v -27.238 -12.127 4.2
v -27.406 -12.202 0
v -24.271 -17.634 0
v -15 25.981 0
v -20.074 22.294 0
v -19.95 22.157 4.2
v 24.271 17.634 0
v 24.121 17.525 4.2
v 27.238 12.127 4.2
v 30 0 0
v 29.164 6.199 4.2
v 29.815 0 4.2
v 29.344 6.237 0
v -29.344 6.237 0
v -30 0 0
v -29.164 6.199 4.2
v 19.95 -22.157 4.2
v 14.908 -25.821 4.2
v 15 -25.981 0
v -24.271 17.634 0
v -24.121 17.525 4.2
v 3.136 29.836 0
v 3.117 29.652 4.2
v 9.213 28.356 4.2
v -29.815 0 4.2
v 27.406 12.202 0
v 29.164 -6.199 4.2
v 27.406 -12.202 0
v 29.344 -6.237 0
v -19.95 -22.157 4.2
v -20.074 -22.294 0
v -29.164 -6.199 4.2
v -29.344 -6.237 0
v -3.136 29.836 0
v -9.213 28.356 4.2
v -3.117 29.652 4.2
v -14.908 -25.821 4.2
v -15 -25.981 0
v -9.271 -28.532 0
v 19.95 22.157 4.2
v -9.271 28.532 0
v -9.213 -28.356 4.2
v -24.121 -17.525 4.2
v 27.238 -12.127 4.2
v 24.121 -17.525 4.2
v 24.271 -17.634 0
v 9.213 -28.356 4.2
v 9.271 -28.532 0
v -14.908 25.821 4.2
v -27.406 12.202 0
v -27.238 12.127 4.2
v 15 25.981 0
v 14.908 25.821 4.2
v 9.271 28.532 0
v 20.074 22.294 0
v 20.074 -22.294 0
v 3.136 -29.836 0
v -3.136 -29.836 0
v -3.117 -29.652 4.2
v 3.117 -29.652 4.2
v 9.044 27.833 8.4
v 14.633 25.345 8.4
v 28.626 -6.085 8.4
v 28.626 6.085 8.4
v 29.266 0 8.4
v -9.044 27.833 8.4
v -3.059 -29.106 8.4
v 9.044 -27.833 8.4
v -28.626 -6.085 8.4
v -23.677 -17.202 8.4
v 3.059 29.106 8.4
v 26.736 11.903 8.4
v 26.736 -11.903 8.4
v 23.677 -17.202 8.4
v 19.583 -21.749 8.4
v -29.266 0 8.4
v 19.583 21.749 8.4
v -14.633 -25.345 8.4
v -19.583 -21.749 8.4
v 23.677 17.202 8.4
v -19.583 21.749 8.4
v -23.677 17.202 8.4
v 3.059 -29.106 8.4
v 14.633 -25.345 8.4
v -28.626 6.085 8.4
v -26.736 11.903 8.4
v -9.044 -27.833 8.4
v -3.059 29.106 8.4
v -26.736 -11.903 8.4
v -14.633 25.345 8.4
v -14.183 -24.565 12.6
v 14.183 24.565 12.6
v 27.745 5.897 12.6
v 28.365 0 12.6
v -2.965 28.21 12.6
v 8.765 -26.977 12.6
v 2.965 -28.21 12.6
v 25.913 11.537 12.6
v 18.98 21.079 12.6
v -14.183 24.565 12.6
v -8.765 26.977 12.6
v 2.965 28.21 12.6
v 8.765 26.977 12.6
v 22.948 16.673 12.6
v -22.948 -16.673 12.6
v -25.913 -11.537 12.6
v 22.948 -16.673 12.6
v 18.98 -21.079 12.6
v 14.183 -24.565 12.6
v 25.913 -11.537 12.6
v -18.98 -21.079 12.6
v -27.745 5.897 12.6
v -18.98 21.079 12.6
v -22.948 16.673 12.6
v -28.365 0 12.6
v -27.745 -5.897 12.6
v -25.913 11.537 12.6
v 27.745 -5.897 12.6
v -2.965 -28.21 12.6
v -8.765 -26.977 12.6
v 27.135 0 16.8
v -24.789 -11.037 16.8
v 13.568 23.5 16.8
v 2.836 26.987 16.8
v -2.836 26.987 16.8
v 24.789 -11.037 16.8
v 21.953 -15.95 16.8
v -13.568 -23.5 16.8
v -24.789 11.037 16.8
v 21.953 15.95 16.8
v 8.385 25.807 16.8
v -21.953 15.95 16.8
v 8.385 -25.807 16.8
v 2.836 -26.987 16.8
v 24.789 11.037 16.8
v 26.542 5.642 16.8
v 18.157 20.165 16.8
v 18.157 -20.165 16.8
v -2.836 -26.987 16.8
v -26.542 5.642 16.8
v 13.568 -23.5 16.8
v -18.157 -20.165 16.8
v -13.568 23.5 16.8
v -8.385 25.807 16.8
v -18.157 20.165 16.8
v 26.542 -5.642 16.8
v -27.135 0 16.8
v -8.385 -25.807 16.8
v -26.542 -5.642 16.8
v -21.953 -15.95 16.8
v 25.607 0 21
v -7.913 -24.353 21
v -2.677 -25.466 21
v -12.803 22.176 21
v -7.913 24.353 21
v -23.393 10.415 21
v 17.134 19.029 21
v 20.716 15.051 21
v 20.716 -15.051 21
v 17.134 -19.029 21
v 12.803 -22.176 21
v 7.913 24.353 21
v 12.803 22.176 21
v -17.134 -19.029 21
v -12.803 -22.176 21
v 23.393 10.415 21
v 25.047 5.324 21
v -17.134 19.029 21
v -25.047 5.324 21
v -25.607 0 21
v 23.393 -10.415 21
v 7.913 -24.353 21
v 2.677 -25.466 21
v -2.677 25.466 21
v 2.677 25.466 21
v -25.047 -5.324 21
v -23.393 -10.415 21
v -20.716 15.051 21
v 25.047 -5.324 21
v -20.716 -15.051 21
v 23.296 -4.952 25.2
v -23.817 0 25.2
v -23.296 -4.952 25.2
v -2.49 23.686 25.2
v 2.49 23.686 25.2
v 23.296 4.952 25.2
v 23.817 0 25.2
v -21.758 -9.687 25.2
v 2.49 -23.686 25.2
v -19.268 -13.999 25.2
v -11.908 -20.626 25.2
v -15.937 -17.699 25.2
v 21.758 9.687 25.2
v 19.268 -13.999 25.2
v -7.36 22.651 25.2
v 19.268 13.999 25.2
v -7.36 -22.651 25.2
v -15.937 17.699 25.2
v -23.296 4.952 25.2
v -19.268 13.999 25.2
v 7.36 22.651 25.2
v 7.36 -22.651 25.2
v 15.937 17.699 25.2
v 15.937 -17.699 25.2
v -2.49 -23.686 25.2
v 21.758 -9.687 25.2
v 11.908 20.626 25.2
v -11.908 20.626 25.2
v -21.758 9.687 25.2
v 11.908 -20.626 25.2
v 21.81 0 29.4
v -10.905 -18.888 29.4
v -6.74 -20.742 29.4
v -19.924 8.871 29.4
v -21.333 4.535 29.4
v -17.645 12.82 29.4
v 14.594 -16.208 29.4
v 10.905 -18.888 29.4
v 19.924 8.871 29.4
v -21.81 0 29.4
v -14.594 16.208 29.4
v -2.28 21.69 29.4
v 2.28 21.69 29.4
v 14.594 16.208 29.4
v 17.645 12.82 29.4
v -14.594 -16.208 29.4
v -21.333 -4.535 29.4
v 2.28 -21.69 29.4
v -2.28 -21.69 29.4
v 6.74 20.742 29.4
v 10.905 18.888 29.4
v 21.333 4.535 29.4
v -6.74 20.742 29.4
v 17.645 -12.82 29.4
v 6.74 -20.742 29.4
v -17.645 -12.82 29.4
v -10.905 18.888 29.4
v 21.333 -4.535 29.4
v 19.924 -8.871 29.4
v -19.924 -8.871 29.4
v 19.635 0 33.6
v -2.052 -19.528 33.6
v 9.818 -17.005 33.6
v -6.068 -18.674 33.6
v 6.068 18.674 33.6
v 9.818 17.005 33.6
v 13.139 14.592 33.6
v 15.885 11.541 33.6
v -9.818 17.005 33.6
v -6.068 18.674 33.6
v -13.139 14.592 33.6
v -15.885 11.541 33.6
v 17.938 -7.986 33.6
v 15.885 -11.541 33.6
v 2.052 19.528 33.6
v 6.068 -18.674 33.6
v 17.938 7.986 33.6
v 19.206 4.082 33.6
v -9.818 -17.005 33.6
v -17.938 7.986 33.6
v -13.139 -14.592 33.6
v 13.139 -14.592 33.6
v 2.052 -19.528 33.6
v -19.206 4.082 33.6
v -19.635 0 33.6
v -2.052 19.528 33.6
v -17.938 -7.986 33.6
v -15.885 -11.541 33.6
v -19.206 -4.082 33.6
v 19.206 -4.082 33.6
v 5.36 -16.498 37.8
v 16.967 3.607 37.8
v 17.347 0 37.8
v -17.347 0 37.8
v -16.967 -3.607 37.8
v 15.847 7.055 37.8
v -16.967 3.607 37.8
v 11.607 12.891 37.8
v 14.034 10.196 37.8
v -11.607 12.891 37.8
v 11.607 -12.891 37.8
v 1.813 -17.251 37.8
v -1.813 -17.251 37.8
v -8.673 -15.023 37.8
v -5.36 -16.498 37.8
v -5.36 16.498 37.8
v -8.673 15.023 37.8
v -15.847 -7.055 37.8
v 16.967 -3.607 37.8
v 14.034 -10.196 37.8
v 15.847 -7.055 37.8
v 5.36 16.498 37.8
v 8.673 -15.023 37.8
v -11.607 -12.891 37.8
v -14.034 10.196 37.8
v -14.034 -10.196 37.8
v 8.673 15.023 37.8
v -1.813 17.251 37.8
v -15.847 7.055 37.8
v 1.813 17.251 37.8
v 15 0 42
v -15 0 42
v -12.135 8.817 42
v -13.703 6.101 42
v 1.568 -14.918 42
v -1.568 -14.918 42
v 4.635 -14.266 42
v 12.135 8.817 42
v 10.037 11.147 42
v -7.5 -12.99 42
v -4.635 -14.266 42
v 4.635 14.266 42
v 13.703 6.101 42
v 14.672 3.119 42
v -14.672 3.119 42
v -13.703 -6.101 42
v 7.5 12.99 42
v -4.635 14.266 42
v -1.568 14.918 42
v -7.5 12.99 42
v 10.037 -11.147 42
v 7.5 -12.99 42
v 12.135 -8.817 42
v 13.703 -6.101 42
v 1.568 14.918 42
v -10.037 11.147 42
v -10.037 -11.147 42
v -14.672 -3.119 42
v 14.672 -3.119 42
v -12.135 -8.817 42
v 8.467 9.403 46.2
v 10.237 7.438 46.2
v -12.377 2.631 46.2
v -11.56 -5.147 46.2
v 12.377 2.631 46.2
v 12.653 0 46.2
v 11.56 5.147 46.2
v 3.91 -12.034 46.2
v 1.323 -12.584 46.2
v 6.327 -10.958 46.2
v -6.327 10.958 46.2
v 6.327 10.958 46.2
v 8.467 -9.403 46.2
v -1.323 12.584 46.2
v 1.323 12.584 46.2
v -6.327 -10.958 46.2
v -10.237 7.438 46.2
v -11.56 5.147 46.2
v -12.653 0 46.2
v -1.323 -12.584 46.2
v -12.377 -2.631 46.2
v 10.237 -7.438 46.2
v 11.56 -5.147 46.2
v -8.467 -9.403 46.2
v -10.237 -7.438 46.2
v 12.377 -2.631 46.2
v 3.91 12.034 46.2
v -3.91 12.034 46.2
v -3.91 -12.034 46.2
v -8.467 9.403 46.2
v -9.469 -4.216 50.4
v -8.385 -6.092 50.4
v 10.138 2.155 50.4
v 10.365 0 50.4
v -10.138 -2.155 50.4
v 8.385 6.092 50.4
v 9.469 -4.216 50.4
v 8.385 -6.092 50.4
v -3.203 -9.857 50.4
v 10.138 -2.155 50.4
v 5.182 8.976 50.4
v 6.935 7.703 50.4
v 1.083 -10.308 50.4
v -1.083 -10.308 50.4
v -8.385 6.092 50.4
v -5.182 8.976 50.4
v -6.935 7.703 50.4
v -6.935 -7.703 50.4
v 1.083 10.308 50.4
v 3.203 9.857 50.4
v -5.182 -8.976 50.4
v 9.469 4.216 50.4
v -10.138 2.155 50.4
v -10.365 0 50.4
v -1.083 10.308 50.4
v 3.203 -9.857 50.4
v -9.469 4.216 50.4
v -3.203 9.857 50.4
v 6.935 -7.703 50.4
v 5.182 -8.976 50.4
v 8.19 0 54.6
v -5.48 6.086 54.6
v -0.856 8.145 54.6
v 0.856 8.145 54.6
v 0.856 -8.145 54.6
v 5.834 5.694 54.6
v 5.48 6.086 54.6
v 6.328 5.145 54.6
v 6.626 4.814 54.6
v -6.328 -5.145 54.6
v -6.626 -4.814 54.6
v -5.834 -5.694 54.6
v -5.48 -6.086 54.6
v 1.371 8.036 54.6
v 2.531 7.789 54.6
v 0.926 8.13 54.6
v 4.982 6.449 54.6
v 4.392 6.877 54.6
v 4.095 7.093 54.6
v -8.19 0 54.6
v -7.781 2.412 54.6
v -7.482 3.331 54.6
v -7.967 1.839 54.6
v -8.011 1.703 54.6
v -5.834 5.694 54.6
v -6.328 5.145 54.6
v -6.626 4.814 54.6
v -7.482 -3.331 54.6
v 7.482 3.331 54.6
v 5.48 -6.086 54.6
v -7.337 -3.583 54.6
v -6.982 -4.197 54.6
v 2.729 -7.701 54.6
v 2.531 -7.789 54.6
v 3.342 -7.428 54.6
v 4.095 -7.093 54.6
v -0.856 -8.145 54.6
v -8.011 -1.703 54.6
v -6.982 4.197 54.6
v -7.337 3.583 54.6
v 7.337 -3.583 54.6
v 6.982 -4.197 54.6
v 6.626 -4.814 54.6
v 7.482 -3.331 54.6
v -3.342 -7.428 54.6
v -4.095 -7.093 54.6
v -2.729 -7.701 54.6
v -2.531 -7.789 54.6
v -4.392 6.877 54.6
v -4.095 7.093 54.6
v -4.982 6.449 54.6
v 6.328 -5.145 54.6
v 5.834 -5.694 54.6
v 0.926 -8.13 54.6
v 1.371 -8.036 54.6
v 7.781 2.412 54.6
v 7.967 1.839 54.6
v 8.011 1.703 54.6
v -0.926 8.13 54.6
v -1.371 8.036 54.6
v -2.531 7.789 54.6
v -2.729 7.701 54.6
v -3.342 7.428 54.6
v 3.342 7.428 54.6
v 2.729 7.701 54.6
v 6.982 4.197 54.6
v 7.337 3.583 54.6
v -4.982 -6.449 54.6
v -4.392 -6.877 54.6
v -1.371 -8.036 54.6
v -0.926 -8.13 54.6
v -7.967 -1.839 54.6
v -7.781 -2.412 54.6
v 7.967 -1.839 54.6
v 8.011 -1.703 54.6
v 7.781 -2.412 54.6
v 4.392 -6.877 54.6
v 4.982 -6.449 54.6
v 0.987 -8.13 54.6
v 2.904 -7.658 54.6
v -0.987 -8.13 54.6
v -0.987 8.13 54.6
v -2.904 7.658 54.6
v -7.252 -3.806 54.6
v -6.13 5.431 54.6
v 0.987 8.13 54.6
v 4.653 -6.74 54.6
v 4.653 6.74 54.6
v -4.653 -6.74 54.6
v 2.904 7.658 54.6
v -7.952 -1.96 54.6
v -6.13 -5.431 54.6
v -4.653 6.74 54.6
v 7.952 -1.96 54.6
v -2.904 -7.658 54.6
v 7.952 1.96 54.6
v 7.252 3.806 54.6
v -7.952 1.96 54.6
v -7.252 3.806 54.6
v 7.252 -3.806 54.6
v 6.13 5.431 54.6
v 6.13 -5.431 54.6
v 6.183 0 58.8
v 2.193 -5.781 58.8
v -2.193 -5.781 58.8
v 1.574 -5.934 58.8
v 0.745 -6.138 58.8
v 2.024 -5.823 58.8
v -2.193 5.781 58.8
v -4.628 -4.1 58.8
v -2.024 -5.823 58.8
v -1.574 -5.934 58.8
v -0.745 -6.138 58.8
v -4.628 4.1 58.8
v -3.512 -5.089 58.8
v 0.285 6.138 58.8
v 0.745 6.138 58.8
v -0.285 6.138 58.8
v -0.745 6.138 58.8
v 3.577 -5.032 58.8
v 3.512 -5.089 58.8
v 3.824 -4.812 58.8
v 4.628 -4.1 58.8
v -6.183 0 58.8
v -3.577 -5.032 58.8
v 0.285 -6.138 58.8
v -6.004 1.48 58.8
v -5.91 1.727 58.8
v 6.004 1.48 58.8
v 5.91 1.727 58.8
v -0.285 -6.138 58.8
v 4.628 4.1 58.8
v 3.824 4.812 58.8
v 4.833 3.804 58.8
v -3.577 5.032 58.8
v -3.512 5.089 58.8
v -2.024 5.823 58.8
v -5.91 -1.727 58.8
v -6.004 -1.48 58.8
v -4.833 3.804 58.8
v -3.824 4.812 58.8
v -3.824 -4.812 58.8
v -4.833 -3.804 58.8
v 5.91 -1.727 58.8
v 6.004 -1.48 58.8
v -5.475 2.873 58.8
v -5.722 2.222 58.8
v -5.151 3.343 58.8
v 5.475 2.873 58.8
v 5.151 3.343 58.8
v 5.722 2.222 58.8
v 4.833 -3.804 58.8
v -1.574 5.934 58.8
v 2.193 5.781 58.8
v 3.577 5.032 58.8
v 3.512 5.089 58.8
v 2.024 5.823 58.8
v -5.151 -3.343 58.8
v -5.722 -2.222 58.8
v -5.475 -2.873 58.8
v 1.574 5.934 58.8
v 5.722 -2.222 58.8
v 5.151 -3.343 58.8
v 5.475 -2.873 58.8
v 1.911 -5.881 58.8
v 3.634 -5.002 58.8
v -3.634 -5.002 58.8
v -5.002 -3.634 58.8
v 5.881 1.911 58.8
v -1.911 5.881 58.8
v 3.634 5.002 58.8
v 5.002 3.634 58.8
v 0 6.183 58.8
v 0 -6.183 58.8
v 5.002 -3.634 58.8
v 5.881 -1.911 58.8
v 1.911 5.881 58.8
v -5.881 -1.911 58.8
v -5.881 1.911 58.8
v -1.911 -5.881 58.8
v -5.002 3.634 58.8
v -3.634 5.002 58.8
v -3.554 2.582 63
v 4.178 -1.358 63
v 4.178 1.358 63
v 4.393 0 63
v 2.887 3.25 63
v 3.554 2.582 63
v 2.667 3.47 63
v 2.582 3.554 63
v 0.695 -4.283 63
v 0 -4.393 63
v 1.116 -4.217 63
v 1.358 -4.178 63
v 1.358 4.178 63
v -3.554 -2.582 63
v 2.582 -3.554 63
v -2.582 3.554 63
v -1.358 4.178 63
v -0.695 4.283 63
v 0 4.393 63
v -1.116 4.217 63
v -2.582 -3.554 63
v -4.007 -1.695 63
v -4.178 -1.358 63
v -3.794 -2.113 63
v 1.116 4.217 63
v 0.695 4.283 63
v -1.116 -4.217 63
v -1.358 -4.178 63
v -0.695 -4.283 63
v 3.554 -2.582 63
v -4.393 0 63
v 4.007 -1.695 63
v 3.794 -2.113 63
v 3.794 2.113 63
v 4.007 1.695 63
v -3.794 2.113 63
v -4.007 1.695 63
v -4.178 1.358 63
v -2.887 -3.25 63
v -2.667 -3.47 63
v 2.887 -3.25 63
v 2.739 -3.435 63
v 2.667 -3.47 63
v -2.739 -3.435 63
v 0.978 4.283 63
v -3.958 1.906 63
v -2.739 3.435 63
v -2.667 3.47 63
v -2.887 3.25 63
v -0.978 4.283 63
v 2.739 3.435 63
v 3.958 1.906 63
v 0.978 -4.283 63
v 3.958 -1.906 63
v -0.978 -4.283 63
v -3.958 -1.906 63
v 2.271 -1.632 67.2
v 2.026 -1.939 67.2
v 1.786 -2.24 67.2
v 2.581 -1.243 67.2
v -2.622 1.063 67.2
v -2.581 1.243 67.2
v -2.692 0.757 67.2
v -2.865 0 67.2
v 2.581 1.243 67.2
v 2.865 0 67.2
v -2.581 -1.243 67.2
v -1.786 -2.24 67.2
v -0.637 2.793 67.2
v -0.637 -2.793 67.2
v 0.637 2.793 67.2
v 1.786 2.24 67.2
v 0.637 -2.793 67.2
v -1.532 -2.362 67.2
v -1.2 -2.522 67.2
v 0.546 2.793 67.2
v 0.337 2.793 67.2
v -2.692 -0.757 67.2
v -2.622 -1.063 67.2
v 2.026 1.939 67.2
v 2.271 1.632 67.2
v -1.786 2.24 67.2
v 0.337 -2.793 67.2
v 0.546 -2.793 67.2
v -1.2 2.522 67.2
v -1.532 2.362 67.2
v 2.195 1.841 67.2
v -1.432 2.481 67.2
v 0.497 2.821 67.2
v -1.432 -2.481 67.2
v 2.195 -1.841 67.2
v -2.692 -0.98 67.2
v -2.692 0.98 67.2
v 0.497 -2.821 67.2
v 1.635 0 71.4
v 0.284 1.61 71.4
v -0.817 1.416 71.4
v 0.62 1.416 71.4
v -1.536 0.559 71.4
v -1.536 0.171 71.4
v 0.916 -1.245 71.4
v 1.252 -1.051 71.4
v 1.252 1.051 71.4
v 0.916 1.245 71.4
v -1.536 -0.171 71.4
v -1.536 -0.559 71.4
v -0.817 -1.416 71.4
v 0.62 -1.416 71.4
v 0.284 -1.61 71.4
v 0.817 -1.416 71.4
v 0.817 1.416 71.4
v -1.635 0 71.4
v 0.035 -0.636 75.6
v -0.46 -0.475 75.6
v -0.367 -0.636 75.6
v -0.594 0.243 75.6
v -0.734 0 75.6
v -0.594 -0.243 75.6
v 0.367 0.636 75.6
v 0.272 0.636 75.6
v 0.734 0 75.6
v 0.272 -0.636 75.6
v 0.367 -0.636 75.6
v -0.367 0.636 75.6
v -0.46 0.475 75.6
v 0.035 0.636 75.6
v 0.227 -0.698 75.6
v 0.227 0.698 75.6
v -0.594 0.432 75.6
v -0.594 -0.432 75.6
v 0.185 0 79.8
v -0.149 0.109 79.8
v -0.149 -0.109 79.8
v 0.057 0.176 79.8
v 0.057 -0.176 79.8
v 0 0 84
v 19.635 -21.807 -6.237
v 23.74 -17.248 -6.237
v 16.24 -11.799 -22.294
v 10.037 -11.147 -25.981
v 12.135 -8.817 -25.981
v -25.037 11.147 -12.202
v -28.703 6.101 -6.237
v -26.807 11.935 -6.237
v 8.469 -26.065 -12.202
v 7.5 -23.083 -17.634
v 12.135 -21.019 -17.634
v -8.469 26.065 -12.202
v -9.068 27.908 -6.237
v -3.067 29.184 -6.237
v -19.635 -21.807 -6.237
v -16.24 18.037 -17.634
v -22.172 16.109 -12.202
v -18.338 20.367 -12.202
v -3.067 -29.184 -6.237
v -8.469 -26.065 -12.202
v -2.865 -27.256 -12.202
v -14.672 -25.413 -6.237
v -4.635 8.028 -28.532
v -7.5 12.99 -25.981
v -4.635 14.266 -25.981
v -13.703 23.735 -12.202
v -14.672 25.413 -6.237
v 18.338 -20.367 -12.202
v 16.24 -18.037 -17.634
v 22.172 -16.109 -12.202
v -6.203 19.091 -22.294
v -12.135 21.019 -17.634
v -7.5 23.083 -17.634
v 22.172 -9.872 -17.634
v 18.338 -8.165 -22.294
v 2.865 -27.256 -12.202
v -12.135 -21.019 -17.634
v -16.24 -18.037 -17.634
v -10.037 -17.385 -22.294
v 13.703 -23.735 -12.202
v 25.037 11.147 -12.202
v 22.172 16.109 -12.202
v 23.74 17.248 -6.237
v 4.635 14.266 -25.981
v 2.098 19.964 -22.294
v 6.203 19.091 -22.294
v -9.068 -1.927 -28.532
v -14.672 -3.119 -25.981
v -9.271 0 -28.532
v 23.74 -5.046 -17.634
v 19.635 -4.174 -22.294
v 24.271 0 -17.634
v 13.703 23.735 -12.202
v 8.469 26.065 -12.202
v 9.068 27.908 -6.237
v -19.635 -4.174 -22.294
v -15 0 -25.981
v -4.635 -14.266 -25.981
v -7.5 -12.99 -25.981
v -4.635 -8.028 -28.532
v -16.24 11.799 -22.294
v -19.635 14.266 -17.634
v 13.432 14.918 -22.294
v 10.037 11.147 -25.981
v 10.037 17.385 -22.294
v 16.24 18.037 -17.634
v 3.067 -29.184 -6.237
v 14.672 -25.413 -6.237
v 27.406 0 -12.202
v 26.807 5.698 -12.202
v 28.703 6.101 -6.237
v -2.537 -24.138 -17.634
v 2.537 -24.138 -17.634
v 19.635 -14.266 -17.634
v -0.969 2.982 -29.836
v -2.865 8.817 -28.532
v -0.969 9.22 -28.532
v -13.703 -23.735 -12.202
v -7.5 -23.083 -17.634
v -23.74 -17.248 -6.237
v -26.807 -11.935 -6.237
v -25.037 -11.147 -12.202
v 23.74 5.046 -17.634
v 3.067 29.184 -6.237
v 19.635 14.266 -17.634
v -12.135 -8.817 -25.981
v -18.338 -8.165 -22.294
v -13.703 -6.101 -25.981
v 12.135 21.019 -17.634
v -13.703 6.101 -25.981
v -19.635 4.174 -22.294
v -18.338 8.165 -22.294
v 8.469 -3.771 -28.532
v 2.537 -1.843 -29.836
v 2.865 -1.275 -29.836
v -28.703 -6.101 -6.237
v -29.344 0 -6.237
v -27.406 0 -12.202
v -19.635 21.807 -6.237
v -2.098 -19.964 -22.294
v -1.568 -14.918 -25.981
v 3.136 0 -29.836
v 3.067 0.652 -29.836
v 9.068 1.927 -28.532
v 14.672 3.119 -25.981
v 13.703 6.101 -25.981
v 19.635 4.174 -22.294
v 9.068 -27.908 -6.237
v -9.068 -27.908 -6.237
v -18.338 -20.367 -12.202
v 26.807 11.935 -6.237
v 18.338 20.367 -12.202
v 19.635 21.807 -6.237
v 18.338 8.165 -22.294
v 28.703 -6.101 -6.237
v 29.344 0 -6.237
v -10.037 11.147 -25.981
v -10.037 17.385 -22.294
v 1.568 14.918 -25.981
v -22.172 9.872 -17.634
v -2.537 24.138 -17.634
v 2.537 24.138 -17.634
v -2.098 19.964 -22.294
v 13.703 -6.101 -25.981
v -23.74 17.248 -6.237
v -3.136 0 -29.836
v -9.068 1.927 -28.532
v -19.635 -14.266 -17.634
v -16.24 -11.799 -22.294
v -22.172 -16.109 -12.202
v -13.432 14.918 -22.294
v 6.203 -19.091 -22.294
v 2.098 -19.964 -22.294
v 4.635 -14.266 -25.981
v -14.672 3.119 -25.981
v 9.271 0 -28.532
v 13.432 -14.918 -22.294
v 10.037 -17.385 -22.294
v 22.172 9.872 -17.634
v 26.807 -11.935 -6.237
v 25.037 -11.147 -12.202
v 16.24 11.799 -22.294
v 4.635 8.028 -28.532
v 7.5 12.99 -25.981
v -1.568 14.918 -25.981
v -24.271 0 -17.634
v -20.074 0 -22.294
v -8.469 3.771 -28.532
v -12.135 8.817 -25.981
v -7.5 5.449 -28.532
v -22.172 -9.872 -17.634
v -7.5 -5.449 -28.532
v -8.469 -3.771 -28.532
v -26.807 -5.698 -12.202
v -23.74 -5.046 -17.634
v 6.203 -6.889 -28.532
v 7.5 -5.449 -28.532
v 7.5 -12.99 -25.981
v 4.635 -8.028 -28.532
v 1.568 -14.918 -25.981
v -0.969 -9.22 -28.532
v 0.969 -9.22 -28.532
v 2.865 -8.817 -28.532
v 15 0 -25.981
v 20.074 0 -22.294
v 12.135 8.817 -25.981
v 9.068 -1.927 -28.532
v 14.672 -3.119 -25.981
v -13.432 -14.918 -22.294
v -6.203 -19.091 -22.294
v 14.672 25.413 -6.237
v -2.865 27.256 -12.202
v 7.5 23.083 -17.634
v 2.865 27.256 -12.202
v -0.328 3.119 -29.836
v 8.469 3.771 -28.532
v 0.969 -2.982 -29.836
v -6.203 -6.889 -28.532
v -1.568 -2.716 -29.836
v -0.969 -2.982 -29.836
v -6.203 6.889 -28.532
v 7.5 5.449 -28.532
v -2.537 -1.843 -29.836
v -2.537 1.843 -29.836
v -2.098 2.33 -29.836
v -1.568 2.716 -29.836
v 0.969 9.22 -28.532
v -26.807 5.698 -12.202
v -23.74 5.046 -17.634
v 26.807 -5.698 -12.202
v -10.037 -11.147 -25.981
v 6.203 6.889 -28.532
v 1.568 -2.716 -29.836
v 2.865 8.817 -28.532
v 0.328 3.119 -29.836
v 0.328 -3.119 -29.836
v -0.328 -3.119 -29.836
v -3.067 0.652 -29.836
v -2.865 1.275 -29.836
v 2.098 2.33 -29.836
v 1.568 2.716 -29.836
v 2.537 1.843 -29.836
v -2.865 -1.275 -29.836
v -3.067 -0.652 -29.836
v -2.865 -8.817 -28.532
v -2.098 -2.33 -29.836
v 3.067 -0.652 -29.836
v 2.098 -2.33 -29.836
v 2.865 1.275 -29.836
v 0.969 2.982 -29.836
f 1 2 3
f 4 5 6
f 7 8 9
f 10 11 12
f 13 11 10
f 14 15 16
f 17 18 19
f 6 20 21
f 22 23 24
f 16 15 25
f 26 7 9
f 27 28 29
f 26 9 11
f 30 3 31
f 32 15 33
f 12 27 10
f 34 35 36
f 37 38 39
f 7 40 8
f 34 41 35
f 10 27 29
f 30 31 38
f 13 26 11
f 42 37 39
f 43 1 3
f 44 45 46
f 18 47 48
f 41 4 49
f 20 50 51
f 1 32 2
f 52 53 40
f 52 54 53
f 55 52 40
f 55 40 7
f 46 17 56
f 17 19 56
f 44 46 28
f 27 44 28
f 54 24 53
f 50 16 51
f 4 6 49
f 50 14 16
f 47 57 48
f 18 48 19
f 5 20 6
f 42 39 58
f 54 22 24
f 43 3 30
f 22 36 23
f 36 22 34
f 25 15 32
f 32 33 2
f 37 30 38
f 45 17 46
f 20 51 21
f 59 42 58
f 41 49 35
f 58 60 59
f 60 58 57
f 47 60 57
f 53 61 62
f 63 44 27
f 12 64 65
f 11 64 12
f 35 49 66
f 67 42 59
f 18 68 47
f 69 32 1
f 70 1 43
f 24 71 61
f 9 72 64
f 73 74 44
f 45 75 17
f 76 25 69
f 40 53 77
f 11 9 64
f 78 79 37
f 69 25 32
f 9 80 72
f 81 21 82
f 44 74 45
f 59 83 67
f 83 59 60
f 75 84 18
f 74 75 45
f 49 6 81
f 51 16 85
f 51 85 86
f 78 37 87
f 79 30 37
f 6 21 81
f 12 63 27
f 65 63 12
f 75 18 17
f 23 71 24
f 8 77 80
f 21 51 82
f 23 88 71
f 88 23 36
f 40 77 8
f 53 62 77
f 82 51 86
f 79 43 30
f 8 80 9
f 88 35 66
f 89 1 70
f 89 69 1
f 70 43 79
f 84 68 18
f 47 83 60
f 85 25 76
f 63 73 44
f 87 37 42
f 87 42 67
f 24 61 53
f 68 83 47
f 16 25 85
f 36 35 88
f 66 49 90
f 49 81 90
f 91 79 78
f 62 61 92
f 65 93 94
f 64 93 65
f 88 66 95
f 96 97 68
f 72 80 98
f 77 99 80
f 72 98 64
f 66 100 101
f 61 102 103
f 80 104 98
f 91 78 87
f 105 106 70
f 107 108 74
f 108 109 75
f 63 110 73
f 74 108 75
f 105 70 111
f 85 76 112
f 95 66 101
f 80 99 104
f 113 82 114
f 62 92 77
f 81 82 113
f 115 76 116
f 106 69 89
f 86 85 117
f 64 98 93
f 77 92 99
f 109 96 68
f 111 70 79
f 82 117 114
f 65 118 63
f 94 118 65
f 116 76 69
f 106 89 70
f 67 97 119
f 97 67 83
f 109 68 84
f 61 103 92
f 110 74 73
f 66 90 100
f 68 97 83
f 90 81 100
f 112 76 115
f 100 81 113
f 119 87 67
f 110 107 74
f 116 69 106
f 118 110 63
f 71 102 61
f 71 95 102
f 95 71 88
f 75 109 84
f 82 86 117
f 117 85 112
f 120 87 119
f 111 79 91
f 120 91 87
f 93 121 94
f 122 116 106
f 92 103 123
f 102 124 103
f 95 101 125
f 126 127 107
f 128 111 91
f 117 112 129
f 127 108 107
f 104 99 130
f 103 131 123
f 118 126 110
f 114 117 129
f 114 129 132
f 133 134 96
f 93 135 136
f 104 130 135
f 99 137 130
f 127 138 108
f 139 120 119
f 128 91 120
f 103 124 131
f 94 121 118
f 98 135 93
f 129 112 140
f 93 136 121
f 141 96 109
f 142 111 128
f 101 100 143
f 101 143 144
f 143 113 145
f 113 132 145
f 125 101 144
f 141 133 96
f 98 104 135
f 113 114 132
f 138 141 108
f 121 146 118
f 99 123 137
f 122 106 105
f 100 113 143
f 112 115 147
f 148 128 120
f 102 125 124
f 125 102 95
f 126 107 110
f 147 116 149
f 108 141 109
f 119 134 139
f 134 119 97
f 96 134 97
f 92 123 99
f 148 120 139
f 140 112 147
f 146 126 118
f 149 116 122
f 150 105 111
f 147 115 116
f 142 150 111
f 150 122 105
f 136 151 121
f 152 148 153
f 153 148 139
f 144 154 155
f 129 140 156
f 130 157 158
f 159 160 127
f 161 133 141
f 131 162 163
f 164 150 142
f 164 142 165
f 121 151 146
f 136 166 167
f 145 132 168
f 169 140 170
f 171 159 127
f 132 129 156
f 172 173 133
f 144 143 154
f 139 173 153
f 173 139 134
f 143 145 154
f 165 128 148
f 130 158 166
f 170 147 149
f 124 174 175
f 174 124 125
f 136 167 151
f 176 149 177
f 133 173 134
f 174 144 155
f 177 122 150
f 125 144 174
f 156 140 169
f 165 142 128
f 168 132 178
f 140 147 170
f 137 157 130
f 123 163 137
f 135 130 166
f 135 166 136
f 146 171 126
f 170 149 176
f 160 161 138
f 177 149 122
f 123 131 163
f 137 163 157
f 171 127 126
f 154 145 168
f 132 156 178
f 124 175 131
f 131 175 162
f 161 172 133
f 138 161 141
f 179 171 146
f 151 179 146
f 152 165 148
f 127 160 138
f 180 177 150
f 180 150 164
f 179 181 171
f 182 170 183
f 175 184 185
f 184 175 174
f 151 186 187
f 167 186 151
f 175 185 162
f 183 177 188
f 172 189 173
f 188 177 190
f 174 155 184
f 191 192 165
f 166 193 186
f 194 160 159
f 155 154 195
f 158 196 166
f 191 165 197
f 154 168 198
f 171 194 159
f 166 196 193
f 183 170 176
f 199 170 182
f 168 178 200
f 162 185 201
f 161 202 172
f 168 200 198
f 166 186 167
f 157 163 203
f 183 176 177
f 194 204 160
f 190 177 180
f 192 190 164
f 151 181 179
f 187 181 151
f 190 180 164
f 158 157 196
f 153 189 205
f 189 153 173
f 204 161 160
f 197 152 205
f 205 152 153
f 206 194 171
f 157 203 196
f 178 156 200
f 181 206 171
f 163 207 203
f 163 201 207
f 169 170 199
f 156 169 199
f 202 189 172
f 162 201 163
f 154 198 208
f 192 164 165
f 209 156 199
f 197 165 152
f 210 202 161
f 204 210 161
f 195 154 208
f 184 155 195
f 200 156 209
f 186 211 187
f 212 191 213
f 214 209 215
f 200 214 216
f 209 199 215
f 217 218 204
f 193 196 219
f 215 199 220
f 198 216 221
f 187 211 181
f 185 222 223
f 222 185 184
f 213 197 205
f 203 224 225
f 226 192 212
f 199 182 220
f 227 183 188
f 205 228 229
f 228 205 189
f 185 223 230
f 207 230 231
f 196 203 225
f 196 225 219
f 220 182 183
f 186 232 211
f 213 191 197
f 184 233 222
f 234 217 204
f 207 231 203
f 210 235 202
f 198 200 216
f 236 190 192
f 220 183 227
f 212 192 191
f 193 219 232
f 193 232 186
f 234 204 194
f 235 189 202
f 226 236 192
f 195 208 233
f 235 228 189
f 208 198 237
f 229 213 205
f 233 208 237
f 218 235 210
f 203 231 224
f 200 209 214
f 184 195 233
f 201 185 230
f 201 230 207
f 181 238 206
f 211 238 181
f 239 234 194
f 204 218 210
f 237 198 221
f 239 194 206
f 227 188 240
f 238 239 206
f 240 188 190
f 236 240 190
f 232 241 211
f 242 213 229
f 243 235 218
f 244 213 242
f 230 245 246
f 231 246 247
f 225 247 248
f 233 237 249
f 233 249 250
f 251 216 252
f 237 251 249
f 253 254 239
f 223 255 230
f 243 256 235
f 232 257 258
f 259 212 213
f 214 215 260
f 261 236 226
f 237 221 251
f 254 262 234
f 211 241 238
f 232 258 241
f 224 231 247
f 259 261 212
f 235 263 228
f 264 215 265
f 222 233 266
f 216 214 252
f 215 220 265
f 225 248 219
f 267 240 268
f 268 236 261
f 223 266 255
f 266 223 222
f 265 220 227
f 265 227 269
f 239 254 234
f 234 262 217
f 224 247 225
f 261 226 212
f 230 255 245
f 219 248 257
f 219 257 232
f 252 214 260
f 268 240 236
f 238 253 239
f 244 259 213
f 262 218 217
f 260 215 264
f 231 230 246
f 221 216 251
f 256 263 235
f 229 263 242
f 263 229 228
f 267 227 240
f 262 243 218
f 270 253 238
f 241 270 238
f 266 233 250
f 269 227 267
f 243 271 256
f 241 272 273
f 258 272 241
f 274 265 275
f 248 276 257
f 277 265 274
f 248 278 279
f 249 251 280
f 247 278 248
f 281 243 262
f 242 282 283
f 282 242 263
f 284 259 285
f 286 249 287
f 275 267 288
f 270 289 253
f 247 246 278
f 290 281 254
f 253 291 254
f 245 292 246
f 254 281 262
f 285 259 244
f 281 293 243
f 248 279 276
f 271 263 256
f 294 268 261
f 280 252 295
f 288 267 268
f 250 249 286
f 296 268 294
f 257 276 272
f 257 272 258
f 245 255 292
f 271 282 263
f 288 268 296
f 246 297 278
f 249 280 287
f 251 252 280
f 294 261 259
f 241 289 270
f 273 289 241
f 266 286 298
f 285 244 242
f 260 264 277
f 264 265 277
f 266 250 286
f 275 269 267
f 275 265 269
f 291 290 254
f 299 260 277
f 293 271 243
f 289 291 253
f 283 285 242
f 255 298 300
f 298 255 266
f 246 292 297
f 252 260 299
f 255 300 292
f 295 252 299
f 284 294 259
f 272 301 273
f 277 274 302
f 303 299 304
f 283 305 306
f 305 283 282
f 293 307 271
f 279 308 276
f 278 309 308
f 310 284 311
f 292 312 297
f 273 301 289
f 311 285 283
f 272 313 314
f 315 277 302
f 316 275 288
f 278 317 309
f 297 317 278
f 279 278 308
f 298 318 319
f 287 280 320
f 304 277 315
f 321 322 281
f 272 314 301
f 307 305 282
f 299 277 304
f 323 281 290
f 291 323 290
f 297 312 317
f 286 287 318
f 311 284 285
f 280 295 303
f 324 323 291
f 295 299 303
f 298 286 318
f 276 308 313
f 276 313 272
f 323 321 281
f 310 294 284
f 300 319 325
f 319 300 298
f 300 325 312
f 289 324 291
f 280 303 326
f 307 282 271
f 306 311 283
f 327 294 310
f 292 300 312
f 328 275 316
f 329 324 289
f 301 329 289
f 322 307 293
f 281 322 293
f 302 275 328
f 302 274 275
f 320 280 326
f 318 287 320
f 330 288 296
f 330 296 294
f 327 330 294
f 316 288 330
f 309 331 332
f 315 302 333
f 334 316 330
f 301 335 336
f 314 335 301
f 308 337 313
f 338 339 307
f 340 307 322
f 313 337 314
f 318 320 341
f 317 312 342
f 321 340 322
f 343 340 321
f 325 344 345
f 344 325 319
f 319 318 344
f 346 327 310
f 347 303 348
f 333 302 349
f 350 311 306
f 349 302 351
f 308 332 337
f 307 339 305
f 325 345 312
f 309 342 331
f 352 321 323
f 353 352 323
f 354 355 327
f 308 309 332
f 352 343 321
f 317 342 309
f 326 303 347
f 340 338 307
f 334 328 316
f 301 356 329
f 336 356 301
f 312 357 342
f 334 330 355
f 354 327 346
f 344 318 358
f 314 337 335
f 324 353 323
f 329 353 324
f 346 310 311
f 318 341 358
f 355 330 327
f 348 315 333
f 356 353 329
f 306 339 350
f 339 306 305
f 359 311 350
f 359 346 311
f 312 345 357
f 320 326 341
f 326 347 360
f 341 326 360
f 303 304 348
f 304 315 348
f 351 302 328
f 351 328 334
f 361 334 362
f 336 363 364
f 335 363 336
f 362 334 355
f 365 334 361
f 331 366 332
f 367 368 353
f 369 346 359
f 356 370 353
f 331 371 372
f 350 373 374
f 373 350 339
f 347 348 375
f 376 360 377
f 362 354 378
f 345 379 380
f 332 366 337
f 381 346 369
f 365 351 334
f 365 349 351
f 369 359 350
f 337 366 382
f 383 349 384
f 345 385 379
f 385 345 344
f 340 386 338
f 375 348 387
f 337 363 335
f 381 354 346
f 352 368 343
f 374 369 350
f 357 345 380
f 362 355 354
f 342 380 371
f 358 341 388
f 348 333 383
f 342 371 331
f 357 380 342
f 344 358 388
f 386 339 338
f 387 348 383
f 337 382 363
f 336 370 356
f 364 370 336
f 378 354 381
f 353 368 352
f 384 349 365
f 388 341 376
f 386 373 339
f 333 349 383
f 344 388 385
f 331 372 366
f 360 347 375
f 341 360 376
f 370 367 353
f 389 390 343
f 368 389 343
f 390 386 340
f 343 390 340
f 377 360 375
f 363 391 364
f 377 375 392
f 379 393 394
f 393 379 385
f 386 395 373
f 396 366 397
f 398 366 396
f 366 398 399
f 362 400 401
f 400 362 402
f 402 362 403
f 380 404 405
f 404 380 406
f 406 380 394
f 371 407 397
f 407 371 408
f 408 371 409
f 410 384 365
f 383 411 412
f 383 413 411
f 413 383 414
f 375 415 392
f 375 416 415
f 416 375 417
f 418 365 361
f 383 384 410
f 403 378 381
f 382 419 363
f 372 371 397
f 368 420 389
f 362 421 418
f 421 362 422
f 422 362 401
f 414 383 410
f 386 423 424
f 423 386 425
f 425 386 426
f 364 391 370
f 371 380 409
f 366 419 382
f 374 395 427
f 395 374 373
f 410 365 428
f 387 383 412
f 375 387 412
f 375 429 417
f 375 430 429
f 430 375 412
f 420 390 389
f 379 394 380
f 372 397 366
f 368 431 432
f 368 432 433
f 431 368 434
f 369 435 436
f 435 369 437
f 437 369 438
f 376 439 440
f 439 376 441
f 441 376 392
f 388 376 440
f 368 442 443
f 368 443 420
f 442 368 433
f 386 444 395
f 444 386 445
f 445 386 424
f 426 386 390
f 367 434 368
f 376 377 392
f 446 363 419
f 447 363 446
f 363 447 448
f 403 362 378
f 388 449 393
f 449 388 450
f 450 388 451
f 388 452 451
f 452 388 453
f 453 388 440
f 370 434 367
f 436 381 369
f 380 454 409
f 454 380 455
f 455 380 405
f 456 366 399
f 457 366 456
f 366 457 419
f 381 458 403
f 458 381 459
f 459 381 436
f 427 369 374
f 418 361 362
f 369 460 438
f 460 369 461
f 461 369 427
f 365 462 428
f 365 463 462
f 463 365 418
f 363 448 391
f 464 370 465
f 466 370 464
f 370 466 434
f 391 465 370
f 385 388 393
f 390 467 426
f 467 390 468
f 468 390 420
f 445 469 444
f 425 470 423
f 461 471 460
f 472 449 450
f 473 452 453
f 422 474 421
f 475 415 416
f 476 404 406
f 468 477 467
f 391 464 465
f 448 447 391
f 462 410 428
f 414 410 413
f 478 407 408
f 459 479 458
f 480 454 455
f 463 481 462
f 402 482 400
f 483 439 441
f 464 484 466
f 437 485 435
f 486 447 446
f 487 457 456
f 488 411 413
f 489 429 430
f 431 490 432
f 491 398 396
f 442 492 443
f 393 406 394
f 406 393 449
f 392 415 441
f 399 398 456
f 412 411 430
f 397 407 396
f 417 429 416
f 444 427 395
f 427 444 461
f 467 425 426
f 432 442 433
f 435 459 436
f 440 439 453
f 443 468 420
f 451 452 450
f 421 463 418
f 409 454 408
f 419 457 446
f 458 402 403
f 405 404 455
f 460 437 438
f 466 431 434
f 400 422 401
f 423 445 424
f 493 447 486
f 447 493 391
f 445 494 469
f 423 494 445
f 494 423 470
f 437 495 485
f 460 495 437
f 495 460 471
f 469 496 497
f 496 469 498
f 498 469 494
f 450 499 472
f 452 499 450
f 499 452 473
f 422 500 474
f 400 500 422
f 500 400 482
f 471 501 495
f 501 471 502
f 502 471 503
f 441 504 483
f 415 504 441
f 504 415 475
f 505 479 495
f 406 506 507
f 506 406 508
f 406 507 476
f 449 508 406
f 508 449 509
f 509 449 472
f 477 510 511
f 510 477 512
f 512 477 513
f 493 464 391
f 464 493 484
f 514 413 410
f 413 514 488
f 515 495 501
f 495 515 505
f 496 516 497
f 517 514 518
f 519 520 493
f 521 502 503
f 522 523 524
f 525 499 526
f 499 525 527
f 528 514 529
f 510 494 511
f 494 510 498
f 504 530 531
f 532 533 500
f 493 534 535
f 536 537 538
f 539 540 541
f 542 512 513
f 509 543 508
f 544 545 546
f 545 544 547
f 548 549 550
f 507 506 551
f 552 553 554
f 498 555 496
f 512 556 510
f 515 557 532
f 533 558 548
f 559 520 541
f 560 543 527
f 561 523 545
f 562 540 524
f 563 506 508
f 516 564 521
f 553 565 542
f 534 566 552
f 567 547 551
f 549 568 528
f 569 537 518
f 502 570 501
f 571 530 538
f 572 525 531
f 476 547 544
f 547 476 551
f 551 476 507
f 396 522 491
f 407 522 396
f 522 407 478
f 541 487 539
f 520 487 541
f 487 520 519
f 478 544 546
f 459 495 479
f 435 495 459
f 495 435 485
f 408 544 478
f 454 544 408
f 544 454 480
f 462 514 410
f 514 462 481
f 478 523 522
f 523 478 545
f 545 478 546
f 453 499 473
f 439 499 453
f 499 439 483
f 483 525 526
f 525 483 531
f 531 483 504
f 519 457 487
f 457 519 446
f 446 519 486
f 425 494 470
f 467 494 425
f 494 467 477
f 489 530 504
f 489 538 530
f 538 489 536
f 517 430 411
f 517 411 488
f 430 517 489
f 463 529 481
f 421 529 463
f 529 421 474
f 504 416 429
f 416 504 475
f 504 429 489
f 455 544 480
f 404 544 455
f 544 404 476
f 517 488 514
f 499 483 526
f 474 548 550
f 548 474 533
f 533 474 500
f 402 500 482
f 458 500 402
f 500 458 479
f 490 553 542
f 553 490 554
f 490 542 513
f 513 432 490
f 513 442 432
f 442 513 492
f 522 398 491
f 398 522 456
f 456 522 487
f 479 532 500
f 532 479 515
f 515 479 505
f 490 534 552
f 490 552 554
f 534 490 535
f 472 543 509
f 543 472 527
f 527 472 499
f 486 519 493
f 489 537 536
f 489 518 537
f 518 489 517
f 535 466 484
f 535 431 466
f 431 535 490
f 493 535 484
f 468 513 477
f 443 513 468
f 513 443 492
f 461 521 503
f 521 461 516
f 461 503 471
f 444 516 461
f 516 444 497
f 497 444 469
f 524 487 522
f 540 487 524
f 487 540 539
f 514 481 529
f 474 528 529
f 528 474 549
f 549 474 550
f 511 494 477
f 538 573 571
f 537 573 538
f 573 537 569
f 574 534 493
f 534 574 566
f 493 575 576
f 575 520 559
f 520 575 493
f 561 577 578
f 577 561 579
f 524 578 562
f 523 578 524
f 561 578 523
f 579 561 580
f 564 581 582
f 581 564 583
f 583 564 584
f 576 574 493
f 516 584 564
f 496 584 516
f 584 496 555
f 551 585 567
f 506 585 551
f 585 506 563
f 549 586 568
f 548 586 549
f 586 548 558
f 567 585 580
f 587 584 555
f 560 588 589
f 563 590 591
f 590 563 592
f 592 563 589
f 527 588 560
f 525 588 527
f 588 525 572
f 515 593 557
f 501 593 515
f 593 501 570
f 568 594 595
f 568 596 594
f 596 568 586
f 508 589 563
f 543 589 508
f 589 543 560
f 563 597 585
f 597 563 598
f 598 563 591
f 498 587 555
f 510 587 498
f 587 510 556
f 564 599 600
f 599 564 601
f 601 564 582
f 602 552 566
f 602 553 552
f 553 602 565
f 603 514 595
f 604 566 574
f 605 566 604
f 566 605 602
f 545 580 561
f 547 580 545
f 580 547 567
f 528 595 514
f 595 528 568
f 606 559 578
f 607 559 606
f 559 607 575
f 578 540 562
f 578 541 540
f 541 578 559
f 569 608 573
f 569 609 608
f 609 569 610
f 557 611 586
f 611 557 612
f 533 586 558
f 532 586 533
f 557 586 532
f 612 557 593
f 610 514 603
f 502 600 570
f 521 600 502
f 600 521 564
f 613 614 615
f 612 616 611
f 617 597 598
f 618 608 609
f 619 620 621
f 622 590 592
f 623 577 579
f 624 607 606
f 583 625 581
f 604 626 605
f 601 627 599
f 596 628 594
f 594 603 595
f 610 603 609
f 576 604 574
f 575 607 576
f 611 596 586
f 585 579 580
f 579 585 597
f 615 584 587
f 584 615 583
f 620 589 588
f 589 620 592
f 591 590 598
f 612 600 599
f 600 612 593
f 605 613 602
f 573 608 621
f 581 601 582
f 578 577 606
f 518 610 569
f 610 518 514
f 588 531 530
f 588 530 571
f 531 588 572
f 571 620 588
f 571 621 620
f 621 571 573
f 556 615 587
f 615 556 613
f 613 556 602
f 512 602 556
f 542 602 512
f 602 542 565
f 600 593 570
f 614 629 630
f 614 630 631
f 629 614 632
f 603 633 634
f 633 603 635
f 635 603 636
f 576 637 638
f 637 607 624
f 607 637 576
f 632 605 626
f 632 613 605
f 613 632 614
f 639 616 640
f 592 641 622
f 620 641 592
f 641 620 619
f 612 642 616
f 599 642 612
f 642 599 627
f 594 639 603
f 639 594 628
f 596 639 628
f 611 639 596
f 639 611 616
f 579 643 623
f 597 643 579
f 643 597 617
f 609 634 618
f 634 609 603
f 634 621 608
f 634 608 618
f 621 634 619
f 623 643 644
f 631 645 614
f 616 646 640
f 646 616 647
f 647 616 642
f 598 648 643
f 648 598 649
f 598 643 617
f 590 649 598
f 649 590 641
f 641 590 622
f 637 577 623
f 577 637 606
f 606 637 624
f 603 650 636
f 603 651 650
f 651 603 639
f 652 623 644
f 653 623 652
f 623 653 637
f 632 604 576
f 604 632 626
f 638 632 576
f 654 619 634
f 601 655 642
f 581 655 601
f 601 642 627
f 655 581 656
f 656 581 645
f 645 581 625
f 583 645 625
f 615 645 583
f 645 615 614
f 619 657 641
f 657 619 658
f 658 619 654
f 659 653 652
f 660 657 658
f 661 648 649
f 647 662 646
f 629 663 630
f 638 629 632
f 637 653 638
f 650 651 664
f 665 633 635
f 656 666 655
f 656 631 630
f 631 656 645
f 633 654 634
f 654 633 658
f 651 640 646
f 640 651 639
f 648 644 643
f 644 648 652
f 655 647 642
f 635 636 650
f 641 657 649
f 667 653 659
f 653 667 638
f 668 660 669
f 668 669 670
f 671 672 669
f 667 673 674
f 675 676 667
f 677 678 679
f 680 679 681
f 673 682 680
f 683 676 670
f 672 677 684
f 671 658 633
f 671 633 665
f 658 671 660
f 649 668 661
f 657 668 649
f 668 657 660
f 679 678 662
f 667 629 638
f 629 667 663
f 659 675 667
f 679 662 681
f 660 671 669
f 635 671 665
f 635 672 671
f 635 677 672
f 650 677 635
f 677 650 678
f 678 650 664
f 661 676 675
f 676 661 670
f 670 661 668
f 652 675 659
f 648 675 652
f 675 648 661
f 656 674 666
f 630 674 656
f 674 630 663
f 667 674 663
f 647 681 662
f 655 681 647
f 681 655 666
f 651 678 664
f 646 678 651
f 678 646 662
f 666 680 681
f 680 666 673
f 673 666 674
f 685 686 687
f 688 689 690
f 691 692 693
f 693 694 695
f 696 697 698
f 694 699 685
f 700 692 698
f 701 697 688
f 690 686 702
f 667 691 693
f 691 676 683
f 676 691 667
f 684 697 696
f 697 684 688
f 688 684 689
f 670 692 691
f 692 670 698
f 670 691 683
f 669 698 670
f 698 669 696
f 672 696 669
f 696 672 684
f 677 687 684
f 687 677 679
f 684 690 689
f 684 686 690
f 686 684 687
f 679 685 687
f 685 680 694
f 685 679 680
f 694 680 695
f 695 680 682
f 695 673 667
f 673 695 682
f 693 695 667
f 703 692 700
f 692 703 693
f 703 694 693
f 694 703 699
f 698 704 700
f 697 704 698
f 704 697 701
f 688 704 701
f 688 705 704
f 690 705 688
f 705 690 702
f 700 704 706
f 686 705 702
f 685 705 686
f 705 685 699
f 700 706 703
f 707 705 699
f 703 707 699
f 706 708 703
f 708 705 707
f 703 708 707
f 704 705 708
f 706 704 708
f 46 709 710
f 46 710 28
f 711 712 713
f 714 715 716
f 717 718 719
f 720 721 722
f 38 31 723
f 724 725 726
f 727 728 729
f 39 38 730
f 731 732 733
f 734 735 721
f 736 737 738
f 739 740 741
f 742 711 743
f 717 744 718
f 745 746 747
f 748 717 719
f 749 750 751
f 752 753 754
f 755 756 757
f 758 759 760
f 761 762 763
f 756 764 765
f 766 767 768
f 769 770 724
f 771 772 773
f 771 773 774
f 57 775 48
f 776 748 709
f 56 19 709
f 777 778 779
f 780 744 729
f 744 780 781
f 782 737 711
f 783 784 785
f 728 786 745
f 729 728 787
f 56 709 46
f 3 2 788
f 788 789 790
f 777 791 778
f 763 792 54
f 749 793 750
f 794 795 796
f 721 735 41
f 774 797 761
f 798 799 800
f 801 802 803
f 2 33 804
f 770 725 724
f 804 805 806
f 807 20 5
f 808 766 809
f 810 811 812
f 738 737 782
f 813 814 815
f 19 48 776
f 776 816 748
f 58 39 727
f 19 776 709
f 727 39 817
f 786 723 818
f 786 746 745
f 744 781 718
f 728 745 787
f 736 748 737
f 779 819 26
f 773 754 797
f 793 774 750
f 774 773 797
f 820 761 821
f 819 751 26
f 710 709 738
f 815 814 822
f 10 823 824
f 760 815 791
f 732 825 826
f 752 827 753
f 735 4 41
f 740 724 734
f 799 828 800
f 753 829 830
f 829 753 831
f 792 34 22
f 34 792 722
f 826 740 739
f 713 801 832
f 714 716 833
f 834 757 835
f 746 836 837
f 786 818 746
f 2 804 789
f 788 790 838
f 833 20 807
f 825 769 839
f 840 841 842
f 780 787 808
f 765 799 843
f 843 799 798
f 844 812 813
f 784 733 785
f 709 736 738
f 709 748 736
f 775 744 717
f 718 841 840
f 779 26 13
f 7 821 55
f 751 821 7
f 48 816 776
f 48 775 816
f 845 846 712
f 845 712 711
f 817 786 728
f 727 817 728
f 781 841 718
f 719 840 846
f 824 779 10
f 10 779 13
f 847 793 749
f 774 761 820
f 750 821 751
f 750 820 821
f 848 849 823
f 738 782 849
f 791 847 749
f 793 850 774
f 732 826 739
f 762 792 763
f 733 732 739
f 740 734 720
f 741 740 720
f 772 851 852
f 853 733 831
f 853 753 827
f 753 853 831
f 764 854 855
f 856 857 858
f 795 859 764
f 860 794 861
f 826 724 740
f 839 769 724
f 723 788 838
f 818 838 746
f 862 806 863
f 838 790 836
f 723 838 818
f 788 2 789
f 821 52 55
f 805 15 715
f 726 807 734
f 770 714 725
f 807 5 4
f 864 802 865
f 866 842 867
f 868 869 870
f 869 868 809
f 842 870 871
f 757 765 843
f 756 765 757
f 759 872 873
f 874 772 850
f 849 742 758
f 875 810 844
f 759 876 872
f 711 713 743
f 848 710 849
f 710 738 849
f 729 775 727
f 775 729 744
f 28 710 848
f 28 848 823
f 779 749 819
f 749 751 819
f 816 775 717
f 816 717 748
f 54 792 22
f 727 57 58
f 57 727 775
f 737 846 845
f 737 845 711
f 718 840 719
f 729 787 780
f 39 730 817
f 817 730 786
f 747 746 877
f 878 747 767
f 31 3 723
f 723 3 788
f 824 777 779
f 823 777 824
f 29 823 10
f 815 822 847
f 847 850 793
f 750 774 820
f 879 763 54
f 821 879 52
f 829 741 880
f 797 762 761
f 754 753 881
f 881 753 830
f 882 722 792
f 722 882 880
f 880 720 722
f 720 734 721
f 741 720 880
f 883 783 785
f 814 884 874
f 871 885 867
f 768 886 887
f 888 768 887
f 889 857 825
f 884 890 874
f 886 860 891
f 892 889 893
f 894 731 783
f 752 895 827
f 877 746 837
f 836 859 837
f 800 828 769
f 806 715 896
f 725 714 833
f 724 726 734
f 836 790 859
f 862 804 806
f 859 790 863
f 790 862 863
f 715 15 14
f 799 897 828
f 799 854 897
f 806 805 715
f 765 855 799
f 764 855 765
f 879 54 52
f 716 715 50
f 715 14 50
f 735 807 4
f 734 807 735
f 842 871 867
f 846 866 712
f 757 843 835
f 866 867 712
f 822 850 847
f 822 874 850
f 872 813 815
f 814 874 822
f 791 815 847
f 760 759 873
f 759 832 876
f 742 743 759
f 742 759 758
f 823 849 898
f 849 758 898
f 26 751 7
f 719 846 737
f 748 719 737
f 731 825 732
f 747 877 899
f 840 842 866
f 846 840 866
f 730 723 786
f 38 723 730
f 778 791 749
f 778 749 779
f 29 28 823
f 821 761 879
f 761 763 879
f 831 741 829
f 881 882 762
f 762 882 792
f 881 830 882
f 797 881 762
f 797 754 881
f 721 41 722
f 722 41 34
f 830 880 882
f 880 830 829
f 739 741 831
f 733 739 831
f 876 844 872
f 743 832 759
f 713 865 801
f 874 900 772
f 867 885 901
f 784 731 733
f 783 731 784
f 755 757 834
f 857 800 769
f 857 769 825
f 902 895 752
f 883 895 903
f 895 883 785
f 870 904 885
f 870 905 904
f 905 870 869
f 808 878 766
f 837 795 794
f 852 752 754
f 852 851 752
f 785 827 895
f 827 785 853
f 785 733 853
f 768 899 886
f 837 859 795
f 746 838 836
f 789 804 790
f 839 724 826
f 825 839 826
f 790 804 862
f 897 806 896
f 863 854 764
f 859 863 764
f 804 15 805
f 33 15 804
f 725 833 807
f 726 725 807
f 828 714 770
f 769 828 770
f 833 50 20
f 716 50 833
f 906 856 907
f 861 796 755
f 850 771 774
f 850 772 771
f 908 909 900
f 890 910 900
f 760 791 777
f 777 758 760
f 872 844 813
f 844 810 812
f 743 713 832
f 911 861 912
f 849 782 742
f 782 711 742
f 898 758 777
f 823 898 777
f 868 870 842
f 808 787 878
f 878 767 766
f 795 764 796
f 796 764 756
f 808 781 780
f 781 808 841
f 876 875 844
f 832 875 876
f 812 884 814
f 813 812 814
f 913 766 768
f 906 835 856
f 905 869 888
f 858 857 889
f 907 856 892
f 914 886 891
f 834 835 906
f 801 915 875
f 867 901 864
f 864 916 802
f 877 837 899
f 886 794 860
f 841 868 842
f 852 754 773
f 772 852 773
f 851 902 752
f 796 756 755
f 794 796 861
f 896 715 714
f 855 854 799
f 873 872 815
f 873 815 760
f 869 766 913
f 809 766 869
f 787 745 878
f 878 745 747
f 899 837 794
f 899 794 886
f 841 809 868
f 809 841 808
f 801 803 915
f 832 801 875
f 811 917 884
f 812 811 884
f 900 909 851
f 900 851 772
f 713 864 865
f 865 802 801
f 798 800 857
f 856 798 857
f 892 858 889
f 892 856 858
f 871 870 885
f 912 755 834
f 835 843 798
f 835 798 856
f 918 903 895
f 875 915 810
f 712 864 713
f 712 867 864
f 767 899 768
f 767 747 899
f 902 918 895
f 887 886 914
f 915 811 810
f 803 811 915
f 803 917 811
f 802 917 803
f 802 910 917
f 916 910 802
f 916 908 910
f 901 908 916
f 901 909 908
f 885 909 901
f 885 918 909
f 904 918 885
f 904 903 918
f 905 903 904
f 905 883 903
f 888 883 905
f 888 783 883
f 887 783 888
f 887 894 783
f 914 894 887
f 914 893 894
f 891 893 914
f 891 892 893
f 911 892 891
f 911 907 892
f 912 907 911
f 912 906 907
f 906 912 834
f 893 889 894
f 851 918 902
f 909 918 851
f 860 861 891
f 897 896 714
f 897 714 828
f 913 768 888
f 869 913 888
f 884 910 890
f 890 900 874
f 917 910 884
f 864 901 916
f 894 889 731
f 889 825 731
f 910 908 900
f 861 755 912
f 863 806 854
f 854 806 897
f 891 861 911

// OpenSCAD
/*
Creates a 3 dimensional raindrop shape.

parameters:
	radius		radius of the sphere on the bottom of the raindrop shape
	centered	boolean value. sets the bottom sphere as centered (true) on [0, 0, 0],
				or sets the entire object in the positive [x, y, z] quadrant
*/

// Radius in millimeters.
radius = 30; // [1:100]

// Height is a multiple of the radius.
height = 2.8; // [2:20]

// Steps are the number of cylinders to make up the upper pointy end.
steps = 20; // [2:50]

// A silly bonus feature for revealing how the script works.
loops = 1; // [0:4]

raindrop3D( radius, height, steps, loops );

module raindrop3D(radius, height, steps, loops){

	sphere(radius);

	for( i = [ 0 : steps * loops - 1 ] ){
		translate([0, 0, radius * height / steps * i])
			cylinder(h = 1 / steps * height * radius,
					r1 = (cos( 180 * i / steps )/2+0.5) * radius,
					r2 = (cos( 180 * (i+1) / steps )/2+0.5) * radius );
	}

}//end of module raindrop3D
